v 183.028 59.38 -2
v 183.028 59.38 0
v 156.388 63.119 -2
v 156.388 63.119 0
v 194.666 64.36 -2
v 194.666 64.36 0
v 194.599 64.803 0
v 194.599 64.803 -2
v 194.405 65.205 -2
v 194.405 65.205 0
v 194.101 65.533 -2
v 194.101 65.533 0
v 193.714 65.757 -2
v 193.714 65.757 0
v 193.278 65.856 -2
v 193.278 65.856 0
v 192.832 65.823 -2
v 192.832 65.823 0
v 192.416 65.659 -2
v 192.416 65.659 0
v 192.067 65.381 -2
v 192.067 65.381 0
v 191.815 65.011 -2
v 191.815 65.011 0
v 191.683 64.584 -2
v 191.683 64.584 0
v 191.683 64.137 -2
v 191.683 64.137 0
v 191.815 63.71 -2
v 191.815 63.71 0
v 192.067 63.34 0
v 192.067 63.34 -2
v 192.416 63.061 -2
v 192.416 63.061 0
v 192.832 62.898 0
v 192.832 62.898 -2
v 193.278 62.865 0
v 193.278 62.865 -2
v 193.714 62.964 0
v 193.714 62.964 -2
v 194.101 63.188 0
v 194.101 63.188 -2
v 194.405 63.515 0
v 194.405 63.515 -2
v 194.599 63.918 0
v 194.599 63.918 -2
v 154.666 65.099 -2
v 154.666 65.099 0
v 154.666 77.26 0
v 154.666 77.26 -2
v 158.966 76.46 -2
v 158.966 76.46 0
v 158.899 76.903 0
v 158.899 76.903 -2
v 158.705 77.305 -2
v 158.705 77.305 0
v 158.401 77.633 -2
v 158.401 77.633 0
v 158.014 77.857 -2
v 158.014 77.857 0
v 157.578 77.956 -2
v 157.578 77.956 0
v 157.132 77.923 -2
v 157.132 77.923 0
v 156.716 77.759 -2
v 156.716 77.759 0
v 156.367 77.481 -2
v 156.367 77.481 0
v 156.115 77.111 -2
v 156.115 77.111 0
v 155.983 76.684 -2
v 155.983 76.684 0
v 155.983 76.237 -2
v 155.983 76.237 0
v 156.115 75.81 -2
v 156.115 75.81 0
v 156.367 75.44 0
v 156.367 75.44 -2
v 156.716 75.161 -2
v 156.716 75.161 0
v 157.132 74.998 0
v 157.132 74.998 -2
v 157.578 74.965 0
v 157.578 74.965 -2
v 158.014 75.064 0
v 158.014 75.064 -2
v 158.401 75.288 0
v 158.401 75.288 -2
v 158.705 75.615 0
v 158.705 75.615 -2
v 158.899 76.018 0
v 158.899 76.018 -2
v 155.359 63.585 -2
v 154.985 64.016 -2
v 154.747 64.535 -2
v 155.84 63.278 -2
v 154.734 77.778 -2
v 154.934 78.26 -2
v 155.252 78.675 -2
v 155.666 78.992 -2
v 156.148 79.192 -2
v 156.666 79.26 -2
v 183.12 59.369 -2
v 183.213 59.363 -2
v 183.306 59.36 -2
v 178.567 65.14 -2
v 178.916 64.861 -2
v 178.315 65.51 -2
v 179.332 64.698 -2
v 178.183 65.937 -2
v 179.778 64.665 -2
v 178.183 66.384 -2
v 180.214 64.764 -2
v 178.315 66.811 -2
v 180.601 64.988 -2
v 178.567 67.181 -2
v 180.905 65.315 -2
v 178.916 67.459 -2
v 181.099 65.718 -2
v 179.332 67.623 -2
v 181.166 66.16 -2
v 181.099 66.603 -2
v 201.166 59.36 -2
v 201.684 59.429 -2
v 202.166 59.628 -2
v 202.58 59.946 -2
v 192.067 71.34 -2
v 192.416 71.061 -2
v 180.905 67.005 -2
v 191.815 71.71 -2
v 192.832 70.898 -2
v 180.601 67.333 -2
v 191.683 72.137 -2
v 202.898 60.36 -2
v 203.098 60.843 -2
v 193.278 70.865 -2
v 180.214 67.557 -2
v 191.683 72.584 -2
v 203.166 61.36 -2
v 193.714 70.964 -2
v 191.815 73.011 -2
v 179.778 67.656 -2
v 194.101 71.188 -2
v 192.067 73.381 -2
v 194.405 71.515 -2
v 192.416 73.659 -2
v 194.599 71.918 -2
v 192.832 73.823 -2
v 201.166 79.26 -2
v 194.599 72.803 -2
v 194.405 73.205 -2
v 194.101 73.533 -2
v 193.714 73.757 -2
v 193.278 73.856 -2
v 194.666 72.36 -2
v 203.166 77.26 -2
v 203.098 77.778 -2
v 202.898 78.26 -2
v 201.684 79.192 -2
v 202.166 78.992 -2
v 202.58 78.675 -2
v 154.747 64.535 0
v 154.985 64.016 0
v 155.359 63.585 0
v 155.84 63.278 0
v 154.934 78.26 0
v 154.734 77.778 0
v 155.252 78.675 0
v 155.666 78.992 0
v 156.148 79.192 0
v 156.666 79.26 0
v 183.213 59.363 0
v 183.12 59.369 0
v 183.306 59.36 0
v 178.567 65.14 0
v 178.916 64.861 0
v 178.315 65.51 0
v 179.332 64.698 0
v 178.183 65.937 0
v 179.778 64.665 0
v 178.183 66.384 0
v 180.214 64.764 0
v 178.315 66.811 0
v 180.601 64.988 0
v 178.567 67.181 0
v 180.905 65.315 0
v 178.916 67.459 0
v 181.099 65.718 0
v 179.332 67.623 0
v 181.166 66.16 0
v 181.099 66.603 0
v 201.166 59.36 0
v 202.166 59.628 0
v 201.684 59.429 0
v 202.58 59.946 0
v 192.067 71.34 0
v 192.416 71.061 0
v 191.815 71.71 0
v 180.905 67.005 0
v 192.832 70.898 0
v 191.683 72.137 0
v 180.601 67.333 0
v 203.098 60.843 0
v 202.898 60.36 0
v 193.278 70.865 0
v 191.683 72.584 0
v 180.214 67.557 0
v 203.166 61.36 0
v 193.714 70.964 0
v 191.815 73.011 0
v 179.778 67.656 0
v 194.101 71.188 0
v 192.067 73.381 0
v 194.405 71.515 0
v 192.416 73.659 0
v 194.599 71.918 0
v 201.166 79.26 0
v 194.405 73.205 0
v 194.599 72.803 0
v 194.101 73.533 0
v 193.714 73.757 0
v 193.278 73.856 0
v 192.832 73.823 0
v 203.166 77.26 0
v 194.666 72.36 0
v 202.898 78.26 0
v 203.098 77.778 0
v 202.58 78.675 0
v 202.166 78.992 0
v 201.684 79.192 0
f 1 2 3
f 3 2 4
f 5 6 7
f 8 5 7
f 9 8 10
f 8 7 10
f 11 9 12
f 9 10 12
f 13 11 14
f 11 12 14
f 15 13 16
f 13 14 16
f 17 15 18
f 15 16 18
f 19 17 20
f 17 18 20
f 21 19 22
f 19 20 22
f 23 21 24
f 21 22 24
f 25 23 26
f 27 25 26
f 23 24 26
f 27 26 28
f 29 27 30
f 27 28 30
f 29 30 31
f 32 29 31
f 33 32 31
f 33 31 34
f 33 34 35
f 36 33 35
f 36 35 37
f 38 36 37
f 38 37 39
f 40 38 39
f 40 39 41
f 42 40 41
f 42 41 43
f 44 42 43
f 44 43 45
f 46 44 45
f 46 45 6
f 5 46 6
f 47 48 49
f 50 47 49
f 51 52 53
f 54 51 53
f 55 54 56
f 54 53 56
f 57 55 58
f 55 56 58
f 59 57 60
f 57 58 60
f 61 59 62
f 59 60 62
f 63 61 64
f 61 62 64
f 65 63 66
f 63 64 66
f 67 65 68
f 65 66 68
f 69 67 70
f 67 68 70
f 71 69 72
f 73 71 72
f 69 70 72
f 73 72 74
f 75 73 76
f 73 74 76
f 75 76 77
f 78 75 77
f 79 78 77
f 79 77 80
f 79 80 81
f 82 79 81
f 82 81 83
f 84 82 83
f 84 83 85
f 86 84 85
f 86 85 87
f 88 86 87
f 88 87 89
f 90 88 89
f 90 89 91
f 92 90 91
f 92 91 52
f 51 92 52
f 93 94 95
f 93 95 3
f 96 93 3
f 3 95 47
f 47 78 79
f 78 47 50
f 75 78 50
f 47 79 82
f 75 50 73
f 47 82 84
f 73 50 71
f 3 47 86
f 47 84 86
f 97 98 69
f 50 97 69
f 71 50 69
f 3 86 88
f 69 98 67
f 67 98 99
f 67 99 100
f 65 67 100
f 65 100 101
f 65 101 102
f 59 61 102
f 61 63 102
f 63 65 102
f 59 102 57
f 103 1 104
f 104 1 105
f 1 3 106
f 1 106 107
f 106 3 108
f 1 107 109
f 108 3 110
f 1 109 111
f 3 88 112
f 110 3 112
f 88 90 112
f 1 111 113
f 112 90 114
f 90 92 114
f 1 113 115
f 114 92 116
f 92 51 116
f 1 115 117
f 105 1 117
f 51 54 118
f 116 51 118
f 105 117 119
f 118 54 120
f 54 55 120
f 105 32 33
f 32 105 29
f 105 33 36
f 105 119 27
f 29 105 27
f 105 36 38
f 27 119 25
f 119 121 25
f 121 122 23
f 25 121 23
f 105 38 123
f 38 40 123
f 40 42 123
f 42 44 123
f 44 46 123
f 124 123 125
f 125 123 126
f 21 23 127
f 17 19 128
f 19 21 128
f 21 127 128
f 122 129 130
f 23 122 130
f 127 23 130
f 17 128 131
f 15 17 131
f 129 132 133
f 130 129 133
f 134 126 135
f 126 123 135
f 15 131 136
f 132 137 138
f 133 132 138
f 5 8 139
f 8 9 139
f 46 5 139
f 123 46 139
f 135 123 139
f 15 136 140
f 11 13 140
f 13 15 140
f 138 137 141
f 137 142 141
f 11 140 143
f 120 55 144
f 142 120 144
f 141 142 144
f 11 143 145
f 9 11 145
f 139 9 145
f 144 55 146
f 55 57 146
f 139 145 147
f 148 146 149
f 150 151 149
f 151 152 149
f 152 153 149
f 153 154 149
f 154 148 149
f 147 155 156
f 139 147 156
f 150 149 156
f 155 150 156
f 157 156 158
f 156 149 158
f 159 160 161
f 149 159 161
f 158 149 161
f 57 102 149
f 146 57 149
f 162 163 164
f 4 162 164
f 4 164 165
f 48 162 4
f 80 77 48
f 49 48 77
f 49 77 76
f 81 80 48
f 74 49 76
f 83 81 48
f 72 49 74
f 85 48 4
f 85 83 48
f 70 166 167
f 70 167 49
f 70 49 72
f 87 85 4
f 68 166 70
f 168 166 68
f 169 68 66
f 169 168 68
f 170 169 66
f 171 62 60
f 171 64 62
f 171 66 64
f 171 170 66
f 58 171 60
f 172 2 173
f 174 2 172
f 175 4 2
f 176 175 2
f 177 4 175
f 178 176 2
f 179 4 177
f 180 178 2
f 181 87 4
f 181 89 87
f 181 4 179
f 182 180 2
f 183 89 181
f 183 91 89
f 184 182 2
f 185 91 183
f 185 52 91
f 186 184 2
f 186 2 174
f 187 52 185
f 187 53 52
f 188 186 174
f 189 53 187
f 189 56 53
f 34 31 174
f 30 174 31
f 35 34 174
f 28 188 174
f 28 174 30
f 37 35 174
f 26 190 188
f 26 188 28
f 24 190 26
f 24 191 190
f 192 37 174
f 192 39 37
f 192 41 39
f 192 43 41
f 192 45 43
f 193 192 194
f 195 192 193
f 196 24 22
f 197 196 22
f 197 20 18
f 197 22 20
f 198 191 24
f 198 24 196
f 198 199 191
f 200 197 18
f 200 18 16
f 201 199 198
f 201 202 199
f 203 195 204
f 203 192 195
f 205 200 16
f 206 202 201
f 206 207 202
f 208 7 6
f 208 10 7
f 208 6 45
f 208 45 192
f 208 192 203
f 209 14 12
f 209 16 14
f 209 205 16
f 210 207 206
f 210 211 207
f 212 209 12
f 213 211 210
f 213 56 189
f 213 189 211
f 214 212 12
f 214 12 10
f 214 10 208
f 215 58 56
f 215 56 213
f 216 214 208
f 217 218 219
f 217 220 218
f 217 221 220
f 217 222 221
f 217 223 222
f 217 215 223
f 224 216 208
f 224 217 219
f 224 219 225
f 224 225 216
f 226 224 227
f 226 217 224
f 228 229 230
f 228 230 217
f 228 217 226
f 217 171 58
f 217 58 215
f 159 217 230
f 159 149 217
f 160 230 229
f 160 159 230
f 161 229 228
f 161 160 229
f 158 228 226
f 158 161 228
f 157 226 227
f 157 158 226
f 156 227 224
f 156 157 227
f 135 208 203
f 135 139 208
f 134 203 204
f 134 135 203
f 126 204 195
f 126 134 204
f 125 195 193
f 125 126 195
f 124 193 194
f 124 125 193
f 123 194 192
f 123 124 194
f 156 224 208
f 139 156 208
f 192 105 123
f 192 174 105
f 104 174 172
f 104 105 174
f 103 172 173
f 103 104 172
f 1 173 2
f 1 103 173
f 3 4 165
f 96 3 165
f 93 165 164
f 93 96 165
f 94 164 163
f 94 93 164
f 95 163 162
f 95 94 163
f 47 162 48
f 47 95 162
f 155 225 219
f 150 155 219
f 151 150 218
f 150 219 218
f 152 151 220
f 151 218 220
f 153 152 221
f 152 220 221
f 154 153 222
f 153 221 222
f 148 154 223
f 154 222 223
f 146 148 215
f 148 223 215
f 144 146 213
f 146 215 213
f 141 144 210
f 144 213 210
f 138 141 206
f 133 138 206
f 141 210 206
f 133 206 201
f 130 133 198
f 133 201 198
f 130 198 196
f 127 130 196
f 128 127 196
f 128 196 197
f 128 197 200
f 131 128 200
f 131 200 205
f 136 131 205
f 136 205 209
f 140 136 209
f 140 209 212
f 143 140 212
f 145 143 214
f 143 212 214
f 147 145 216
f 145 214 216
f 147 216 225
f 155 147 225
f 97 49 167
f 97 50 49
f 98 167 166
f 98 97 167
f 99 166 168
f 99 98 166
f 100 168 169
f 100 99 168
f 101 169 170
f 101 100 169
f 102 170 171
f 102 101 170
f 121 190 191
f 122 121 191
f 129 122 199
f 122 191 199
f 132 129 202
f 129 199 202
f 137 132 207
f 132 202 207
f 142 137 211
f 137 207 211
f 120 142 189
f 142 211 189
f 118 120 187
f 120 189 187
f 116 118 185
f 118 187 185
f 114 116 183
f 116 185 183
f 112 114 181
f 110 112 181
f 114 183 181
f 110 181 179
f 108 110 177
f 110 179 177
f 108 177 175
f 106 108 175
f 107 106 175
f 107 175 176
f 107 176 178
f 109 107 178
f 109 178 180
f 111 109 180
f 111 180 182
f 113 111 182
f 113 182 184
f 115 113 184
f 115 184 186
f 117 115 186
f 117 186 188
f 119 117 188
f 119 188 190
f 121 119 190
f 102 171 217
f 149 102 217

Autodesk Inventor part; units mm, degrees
ref_plane "YZ Plane" through (0, 0, 0) normal (1, 0, 0) x (0, 1, 0)
ref_plane "XZ Plane" through (0, 0, 0) normal (0, 1, 0) x (-1, 0, 0)
ref_plane "XY Plane" through (0, 0, 0) normal (0, 0, 1) x (1, 0, 0)
sketch "スケッチ1" plane through (0, 0, 0) normal (0, 0, 1) x (1, 0, 0)
  line L0 (203.1661, 661.0271) -> (203.1661, -646.9853)
  line L1 (203.1661, 628.7976) -> (183.1661, 628.7976)
  line L2 (183.1661, 660.9684) -> (183.1661, -646.9853)
  line L3 (183.1661, 25.0147) -> (203.1661, 25.0147)
  line L4 (183.1661, -646.9853) -> (203.1661, -646.9853)
  line L5 (183.1661, 660.9684) -> (203.1661, 661.0271)
  line L6 (168.1661, 612.8976) -> (195.9661, 612.8976)
  line L7 (195.9661, 612.8976) -> (195.9661, 628.7976)
  line L8 (195.9661, 628.7976) -> (168.1661, 628.7976)
  line L9 (168.1661, 628.7976) -> (168.1661, 612.8976)
  circle A0 centre (170.9661, 615.6976) radius 1.5
  circle A1 centre (193.1661, 625.9976) radius 1.5
  circle A2 centre (193.1661, 633.9976) radius 1.5
  line L10 (154.6661, 79.2604) -> (182.4661, 79.2604)
  line L11 (182.4661, 79.2604) -> (182.4661, 63.3604)
  line L12 (182.4661, 63.3604) -> (154.6661, 63.3604)
  line L13 (154.6661, 63.3604) -> (154.6661, 79.2604)
  circle A3 centre (157.4661, 76.4604) radius 1.5
  circle A4 centre (179.6661, 66.1604) radius 1.5
  circle A5 centre (193.1661, 64.3604) radius 1.5
  line L14 (183.1661, 638.9976) -> (203.1661, 638.9976)
  line L15 (195.9661, 612.8976) -> (203.1661, 612.8976)
  line L16 (203.1661, 612.8976) -> (203.1661, 638.9976)
  line L17 (183.1661, 638.9976) -> (168.1661, 628.7976)
  line L18 (183.1661, 59.3604) -> (203.1661, 59.3604)
  line L19 (182.4661, 79.2604) -> (203.1661, 79.2604)
  line L20 (203.1661, 79.2604) -> (203.1661, 59.3604)
  line L21 (183.1661, 59.3604) -> (154.6661, 63.3604)
  circle A6 centre (193.1661, 72.3604) radius 1.5
  point P0 (0, 0)
  point P1 (-212.8828, -214.6519)
  dimension "d0" = 672
  dimension "d1" = 27.8
  dimension "d2" = 15.9
  dimension "d3" = 3
  dimension "d4" = 3
  dimension "d5" = 2.8
  dimension "d6" = 2.8
  dimension "d7" = 2.8
  dimension "d8" = 2.8
  dimension "d9" = 0
  dimension "d10" = 10
  dimension "d11" = 3
  dimension "d12" = 8
  dimension "d13" = 10
  dimension "d14" = 27
  dimension "d15" = 27.8
  dimension "d16" = 15.9
  dimension "d17" = 3
  dimension "d18" = 3
  dimension "d19" = 2.8
  dimension "d20" = 2.8
  dimension "d21" = 2.8
  dimension "d22" = 2.8
  dimension "d24" = 560
  dimension "d25" = 3
  dimension "d27" = 10
  dimension "d28" = 5
  dimension "d29" = 5
  dimension "d33" = 20
  dimension "d34" = 203.1661
  dimension "d39" = 3.5
  dimension "d40" = 3
  dimension "d41" = 10
  dimension "d42" = 8
  dimension "d43" = 4
extrude "押し出し1" add sketch "スケッチ1" against normal blind 2 contours L0 L18 L2 L19 | L2 L21 L12 L11 L19 | L11 L12 L13 L10
fillet "フィレット1" radius 2 5 edges at (154.6661, 79.2604, -1) (154.6661, 63.3604, -1) (183.1661, 59.3604, -1) (203.1661, 59.3604, -1) (203.1661, 79.2604, -1)
equation "\"d6\" = d5"
equation "\"d7\" = d5"
equation "\"d8\" = d5"
equation "\"d20\" = d19"
equation "\"d21\" = d19"
equation "\"d22\" = d19"
properties part number "dribl-v1-Plate-12" material "アルミニウム 6061"
